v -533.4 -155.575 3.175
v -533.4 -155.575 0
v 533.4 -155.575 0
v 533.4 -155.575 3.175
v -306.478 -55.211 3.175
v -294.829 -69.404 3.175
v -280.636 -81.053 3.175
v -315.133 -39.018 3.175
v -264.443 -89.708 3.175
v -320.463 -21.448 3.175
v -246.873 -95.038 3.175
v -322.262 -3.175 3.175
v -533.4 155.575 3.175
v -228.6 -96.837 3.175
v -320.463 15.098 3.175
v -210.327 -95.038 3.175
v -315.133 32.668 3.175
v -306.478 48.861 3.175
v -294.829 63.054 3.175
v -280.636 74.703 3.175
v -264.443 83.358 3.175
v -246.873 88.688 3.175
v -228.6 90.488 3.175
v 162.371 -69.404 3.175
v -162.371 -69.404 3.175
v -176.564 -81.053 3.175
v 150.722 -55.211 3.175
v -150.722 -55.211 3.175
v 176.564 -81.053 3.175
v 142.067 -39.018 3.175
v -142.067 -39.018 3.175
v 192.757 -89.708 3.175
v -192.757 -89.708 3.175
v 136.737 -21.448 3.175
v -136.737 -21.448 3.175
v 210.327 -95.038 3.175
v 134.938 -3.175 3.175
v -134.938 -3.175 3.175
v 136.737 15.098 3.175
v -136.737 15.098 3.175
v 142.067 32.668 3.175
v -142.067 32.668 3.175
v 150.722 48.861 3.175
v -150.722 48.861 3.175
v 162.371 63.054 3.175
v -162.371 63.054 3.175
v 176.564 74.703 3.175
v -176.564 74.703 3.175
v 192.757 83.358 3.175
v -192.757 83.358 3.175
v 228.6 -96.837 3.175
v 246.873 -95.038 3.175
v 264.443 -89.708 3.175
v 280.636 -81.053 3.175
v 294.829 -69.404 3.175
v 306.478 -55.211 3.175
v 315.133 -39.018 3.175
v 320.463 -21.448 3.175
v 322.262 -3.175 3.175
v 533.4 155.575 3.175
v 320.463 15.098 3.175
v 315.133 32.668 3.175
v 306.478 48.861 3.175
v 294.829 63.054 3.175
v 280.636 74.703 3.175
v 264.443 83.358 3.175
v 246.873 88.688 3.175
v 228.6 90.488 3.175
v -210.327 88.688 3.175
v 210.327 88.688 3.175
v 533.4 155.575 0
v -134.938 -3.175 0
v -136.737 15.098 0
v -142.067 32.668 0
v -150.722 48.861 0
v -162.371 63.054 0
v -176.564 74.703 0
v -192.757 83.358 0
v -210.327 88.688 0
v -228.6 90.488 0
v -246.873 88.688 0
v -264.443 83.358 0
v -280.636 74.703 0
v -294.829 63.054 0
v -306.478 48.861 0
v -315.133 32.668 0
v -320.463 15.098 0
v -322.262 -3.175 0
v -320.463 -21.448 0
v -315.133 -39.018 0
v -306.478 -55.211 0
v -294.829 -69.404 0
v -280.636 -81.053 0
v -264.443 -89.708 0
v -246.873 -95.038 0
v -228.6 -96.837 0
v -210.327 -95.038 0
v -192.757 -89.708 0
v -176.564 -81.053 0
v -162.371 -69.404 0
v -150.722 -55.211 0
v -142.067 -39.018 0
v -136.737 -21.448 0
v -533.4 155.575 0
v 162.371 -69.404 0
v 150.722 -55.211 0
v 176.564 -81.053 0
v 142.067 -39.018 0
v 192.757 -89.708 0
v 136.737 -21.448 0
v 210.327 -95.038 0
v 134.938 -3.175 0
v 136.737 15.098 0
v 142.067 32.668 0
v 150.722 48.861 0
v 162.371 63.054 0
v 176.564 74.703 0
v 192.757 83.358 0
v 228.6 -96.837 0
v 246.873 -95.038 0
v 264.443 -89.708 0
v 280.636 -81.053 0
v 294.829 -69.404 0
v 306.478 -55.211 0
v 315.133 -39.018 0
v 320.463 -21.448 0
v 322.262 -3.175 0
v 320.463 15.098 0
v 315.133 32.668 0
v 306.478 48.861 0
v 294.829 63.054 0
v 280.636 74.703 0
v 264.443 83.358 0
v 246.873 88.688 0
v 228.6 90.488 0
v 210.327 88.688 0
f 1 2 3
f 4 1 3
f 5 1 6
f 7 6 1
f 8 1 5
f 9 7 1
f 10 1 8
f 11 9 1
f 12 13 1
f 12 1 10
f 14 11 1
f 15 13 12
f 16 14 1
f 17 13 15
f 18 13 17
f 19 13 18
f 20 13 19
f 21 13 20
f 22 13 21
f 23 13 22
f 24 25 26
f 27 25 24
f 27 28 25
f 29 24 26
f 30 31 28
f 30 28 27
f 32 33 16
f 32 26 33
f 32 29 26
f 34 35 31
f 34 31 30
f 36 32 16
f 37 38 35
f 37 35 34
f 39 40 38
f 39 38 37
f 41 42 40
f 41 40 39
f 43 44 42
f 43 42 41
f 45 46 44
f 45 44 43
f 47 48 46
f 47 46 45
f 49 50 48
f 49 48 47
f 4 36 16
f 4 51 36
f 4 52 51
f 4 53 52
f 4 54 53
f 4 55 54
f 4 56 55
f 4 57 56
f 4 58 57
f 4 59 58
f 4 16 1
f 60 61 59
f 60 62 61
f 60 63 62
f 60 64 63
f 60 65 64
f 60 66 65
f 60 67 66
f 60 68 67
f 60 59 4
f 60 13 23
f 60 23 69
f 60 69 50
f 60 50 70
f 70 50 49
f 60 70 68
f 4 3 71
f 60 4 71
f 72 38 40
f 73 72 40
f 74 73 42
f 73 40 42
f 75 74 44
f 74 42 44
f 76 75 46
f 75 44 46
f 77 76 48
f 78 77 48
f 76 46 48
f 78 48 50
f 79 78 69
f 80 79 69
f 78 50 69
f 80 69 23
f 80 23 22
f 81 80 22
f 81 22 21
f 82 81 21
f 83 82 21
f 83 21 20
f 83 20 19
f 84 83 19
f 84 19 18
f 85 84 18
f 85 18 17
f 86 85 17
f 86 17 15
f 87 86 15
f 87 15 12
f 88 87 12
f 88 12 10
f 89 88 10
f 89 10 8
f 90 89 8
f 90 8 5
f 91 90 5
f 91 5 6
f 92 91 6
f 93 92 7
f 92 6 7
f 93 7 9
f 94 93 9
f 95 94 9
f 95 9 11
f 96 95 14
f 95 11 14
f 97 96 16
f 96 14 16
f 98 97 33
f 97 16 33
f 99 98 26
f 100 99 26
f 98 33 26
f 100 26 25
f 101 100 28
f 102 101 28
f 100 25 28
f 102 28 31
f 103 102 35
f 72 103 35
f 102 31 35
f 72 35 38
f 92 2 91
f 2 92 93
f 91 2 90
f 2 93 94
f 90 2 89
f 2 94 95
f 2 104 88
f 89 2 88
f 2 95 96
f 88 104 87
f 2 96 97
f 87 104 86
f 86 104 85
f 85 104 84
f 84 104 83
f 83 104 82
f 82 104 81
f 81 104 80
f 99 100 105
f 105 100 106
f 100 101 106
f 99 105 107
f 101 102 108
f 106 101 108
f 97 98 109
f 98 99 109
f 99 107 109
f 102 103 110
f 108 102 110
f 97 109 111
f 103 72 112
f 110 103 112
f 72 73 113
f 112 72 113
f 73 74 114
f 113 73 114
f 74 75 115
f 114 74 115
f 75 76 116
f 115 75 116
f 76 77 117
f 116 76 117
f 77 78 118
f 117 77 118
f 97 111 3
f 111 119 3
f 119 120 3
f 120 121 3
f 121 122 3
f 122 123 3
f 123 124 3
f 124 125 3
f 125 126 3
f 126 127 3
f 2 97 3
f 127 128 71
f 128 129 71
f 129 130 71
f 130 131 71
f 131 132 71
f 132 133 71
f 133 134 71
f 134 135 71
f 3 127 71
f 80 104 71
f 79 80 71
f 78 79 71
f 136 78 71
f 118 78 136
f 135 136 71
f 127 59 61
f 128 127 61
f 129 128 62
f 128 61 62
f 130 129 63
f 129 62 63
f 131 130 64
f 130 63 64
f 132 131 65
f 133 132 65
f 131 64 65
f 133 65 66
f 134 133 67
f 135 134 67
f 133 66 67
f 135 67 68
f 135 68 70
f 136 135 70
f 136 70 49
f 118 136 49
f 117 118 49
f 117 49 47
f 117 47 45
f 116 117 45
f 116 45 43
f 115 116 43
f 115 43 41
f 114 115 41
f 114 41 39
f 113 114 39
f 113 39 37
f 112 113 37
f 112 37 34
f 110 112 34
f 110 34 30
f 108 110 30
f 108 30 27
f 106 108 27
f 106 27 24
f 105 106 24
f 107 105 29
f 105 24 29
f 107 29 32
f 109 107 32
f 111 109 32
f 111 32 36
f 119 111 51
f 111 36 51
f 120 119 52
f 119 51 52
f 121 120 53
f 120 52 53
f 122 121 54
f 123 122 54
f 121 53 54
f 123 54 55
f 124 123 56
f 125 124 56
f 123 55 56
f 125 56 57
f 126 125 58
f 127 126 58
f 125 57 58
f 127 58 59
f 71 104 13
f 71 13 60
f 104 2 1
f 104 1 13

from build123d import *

# Parameters (mm, degrees)
SKETCH1_W           = 1066.8
SKETCH1_H           = 311.15
BOSS_EXTRUDE1_DEPTH = 3.175
CUT_EXTRUDE1_REACH  = 5.175
SKETCH2_R           = 93.6625


with BuildPart() as part:
    # Sketch1 → Boss-Extrude1 (new body)
    with BuildSketch(Plane.XY):
        Rectangle(SKETCH1_W, SKETCH1_H)
    extrude(amount=BOSS_EXTRUDE1_DEPTH)

    # Sketch2 → Cut-Extrude1 (cut, up to next)
    with BuildSketch(Plane.XY.offset(3.175), mode=Mode.PRIVATE) as cut_extrude1_sk1:
        with Locations((228.6, -3.175)):
            Circle(SKETCH2_R)
    cut_extrude1_tool1 = extrude(cut_extrude1_sk1.sketch, amount=-CUT_EXTRUDE1_REACH, mode=Mode.PRIVATE) & part.part
    add(cut_extrude1_tool1.solids().sort_by_distance((228.6, -3.175, 3.175))[0], mode=Mode.SUBTRACT)
    # Sketch2 → Cut-Extrude1 (cut, up to next)
    with BuildSketch(Plane.XY.offset(3.175), mode=Mode.PRIVATE) as cut_extrude1_sk2:
        with Locations((-228.6, -3.175)):
            Circle(SKETCH2_R)
    cut_extrude1_tool2 = extrude(cut_extrude1_sk2.sketch, amount=-CUT_EXTRUDE1_REACH, mode=Mode.PRIVATE) & part.part
    add(cut_extrude1_tool2.solids().sort_by_distance((-228.6, -3.175, 3.175))[0], mode=Mode.SUBTRACT)


solid = part.part
